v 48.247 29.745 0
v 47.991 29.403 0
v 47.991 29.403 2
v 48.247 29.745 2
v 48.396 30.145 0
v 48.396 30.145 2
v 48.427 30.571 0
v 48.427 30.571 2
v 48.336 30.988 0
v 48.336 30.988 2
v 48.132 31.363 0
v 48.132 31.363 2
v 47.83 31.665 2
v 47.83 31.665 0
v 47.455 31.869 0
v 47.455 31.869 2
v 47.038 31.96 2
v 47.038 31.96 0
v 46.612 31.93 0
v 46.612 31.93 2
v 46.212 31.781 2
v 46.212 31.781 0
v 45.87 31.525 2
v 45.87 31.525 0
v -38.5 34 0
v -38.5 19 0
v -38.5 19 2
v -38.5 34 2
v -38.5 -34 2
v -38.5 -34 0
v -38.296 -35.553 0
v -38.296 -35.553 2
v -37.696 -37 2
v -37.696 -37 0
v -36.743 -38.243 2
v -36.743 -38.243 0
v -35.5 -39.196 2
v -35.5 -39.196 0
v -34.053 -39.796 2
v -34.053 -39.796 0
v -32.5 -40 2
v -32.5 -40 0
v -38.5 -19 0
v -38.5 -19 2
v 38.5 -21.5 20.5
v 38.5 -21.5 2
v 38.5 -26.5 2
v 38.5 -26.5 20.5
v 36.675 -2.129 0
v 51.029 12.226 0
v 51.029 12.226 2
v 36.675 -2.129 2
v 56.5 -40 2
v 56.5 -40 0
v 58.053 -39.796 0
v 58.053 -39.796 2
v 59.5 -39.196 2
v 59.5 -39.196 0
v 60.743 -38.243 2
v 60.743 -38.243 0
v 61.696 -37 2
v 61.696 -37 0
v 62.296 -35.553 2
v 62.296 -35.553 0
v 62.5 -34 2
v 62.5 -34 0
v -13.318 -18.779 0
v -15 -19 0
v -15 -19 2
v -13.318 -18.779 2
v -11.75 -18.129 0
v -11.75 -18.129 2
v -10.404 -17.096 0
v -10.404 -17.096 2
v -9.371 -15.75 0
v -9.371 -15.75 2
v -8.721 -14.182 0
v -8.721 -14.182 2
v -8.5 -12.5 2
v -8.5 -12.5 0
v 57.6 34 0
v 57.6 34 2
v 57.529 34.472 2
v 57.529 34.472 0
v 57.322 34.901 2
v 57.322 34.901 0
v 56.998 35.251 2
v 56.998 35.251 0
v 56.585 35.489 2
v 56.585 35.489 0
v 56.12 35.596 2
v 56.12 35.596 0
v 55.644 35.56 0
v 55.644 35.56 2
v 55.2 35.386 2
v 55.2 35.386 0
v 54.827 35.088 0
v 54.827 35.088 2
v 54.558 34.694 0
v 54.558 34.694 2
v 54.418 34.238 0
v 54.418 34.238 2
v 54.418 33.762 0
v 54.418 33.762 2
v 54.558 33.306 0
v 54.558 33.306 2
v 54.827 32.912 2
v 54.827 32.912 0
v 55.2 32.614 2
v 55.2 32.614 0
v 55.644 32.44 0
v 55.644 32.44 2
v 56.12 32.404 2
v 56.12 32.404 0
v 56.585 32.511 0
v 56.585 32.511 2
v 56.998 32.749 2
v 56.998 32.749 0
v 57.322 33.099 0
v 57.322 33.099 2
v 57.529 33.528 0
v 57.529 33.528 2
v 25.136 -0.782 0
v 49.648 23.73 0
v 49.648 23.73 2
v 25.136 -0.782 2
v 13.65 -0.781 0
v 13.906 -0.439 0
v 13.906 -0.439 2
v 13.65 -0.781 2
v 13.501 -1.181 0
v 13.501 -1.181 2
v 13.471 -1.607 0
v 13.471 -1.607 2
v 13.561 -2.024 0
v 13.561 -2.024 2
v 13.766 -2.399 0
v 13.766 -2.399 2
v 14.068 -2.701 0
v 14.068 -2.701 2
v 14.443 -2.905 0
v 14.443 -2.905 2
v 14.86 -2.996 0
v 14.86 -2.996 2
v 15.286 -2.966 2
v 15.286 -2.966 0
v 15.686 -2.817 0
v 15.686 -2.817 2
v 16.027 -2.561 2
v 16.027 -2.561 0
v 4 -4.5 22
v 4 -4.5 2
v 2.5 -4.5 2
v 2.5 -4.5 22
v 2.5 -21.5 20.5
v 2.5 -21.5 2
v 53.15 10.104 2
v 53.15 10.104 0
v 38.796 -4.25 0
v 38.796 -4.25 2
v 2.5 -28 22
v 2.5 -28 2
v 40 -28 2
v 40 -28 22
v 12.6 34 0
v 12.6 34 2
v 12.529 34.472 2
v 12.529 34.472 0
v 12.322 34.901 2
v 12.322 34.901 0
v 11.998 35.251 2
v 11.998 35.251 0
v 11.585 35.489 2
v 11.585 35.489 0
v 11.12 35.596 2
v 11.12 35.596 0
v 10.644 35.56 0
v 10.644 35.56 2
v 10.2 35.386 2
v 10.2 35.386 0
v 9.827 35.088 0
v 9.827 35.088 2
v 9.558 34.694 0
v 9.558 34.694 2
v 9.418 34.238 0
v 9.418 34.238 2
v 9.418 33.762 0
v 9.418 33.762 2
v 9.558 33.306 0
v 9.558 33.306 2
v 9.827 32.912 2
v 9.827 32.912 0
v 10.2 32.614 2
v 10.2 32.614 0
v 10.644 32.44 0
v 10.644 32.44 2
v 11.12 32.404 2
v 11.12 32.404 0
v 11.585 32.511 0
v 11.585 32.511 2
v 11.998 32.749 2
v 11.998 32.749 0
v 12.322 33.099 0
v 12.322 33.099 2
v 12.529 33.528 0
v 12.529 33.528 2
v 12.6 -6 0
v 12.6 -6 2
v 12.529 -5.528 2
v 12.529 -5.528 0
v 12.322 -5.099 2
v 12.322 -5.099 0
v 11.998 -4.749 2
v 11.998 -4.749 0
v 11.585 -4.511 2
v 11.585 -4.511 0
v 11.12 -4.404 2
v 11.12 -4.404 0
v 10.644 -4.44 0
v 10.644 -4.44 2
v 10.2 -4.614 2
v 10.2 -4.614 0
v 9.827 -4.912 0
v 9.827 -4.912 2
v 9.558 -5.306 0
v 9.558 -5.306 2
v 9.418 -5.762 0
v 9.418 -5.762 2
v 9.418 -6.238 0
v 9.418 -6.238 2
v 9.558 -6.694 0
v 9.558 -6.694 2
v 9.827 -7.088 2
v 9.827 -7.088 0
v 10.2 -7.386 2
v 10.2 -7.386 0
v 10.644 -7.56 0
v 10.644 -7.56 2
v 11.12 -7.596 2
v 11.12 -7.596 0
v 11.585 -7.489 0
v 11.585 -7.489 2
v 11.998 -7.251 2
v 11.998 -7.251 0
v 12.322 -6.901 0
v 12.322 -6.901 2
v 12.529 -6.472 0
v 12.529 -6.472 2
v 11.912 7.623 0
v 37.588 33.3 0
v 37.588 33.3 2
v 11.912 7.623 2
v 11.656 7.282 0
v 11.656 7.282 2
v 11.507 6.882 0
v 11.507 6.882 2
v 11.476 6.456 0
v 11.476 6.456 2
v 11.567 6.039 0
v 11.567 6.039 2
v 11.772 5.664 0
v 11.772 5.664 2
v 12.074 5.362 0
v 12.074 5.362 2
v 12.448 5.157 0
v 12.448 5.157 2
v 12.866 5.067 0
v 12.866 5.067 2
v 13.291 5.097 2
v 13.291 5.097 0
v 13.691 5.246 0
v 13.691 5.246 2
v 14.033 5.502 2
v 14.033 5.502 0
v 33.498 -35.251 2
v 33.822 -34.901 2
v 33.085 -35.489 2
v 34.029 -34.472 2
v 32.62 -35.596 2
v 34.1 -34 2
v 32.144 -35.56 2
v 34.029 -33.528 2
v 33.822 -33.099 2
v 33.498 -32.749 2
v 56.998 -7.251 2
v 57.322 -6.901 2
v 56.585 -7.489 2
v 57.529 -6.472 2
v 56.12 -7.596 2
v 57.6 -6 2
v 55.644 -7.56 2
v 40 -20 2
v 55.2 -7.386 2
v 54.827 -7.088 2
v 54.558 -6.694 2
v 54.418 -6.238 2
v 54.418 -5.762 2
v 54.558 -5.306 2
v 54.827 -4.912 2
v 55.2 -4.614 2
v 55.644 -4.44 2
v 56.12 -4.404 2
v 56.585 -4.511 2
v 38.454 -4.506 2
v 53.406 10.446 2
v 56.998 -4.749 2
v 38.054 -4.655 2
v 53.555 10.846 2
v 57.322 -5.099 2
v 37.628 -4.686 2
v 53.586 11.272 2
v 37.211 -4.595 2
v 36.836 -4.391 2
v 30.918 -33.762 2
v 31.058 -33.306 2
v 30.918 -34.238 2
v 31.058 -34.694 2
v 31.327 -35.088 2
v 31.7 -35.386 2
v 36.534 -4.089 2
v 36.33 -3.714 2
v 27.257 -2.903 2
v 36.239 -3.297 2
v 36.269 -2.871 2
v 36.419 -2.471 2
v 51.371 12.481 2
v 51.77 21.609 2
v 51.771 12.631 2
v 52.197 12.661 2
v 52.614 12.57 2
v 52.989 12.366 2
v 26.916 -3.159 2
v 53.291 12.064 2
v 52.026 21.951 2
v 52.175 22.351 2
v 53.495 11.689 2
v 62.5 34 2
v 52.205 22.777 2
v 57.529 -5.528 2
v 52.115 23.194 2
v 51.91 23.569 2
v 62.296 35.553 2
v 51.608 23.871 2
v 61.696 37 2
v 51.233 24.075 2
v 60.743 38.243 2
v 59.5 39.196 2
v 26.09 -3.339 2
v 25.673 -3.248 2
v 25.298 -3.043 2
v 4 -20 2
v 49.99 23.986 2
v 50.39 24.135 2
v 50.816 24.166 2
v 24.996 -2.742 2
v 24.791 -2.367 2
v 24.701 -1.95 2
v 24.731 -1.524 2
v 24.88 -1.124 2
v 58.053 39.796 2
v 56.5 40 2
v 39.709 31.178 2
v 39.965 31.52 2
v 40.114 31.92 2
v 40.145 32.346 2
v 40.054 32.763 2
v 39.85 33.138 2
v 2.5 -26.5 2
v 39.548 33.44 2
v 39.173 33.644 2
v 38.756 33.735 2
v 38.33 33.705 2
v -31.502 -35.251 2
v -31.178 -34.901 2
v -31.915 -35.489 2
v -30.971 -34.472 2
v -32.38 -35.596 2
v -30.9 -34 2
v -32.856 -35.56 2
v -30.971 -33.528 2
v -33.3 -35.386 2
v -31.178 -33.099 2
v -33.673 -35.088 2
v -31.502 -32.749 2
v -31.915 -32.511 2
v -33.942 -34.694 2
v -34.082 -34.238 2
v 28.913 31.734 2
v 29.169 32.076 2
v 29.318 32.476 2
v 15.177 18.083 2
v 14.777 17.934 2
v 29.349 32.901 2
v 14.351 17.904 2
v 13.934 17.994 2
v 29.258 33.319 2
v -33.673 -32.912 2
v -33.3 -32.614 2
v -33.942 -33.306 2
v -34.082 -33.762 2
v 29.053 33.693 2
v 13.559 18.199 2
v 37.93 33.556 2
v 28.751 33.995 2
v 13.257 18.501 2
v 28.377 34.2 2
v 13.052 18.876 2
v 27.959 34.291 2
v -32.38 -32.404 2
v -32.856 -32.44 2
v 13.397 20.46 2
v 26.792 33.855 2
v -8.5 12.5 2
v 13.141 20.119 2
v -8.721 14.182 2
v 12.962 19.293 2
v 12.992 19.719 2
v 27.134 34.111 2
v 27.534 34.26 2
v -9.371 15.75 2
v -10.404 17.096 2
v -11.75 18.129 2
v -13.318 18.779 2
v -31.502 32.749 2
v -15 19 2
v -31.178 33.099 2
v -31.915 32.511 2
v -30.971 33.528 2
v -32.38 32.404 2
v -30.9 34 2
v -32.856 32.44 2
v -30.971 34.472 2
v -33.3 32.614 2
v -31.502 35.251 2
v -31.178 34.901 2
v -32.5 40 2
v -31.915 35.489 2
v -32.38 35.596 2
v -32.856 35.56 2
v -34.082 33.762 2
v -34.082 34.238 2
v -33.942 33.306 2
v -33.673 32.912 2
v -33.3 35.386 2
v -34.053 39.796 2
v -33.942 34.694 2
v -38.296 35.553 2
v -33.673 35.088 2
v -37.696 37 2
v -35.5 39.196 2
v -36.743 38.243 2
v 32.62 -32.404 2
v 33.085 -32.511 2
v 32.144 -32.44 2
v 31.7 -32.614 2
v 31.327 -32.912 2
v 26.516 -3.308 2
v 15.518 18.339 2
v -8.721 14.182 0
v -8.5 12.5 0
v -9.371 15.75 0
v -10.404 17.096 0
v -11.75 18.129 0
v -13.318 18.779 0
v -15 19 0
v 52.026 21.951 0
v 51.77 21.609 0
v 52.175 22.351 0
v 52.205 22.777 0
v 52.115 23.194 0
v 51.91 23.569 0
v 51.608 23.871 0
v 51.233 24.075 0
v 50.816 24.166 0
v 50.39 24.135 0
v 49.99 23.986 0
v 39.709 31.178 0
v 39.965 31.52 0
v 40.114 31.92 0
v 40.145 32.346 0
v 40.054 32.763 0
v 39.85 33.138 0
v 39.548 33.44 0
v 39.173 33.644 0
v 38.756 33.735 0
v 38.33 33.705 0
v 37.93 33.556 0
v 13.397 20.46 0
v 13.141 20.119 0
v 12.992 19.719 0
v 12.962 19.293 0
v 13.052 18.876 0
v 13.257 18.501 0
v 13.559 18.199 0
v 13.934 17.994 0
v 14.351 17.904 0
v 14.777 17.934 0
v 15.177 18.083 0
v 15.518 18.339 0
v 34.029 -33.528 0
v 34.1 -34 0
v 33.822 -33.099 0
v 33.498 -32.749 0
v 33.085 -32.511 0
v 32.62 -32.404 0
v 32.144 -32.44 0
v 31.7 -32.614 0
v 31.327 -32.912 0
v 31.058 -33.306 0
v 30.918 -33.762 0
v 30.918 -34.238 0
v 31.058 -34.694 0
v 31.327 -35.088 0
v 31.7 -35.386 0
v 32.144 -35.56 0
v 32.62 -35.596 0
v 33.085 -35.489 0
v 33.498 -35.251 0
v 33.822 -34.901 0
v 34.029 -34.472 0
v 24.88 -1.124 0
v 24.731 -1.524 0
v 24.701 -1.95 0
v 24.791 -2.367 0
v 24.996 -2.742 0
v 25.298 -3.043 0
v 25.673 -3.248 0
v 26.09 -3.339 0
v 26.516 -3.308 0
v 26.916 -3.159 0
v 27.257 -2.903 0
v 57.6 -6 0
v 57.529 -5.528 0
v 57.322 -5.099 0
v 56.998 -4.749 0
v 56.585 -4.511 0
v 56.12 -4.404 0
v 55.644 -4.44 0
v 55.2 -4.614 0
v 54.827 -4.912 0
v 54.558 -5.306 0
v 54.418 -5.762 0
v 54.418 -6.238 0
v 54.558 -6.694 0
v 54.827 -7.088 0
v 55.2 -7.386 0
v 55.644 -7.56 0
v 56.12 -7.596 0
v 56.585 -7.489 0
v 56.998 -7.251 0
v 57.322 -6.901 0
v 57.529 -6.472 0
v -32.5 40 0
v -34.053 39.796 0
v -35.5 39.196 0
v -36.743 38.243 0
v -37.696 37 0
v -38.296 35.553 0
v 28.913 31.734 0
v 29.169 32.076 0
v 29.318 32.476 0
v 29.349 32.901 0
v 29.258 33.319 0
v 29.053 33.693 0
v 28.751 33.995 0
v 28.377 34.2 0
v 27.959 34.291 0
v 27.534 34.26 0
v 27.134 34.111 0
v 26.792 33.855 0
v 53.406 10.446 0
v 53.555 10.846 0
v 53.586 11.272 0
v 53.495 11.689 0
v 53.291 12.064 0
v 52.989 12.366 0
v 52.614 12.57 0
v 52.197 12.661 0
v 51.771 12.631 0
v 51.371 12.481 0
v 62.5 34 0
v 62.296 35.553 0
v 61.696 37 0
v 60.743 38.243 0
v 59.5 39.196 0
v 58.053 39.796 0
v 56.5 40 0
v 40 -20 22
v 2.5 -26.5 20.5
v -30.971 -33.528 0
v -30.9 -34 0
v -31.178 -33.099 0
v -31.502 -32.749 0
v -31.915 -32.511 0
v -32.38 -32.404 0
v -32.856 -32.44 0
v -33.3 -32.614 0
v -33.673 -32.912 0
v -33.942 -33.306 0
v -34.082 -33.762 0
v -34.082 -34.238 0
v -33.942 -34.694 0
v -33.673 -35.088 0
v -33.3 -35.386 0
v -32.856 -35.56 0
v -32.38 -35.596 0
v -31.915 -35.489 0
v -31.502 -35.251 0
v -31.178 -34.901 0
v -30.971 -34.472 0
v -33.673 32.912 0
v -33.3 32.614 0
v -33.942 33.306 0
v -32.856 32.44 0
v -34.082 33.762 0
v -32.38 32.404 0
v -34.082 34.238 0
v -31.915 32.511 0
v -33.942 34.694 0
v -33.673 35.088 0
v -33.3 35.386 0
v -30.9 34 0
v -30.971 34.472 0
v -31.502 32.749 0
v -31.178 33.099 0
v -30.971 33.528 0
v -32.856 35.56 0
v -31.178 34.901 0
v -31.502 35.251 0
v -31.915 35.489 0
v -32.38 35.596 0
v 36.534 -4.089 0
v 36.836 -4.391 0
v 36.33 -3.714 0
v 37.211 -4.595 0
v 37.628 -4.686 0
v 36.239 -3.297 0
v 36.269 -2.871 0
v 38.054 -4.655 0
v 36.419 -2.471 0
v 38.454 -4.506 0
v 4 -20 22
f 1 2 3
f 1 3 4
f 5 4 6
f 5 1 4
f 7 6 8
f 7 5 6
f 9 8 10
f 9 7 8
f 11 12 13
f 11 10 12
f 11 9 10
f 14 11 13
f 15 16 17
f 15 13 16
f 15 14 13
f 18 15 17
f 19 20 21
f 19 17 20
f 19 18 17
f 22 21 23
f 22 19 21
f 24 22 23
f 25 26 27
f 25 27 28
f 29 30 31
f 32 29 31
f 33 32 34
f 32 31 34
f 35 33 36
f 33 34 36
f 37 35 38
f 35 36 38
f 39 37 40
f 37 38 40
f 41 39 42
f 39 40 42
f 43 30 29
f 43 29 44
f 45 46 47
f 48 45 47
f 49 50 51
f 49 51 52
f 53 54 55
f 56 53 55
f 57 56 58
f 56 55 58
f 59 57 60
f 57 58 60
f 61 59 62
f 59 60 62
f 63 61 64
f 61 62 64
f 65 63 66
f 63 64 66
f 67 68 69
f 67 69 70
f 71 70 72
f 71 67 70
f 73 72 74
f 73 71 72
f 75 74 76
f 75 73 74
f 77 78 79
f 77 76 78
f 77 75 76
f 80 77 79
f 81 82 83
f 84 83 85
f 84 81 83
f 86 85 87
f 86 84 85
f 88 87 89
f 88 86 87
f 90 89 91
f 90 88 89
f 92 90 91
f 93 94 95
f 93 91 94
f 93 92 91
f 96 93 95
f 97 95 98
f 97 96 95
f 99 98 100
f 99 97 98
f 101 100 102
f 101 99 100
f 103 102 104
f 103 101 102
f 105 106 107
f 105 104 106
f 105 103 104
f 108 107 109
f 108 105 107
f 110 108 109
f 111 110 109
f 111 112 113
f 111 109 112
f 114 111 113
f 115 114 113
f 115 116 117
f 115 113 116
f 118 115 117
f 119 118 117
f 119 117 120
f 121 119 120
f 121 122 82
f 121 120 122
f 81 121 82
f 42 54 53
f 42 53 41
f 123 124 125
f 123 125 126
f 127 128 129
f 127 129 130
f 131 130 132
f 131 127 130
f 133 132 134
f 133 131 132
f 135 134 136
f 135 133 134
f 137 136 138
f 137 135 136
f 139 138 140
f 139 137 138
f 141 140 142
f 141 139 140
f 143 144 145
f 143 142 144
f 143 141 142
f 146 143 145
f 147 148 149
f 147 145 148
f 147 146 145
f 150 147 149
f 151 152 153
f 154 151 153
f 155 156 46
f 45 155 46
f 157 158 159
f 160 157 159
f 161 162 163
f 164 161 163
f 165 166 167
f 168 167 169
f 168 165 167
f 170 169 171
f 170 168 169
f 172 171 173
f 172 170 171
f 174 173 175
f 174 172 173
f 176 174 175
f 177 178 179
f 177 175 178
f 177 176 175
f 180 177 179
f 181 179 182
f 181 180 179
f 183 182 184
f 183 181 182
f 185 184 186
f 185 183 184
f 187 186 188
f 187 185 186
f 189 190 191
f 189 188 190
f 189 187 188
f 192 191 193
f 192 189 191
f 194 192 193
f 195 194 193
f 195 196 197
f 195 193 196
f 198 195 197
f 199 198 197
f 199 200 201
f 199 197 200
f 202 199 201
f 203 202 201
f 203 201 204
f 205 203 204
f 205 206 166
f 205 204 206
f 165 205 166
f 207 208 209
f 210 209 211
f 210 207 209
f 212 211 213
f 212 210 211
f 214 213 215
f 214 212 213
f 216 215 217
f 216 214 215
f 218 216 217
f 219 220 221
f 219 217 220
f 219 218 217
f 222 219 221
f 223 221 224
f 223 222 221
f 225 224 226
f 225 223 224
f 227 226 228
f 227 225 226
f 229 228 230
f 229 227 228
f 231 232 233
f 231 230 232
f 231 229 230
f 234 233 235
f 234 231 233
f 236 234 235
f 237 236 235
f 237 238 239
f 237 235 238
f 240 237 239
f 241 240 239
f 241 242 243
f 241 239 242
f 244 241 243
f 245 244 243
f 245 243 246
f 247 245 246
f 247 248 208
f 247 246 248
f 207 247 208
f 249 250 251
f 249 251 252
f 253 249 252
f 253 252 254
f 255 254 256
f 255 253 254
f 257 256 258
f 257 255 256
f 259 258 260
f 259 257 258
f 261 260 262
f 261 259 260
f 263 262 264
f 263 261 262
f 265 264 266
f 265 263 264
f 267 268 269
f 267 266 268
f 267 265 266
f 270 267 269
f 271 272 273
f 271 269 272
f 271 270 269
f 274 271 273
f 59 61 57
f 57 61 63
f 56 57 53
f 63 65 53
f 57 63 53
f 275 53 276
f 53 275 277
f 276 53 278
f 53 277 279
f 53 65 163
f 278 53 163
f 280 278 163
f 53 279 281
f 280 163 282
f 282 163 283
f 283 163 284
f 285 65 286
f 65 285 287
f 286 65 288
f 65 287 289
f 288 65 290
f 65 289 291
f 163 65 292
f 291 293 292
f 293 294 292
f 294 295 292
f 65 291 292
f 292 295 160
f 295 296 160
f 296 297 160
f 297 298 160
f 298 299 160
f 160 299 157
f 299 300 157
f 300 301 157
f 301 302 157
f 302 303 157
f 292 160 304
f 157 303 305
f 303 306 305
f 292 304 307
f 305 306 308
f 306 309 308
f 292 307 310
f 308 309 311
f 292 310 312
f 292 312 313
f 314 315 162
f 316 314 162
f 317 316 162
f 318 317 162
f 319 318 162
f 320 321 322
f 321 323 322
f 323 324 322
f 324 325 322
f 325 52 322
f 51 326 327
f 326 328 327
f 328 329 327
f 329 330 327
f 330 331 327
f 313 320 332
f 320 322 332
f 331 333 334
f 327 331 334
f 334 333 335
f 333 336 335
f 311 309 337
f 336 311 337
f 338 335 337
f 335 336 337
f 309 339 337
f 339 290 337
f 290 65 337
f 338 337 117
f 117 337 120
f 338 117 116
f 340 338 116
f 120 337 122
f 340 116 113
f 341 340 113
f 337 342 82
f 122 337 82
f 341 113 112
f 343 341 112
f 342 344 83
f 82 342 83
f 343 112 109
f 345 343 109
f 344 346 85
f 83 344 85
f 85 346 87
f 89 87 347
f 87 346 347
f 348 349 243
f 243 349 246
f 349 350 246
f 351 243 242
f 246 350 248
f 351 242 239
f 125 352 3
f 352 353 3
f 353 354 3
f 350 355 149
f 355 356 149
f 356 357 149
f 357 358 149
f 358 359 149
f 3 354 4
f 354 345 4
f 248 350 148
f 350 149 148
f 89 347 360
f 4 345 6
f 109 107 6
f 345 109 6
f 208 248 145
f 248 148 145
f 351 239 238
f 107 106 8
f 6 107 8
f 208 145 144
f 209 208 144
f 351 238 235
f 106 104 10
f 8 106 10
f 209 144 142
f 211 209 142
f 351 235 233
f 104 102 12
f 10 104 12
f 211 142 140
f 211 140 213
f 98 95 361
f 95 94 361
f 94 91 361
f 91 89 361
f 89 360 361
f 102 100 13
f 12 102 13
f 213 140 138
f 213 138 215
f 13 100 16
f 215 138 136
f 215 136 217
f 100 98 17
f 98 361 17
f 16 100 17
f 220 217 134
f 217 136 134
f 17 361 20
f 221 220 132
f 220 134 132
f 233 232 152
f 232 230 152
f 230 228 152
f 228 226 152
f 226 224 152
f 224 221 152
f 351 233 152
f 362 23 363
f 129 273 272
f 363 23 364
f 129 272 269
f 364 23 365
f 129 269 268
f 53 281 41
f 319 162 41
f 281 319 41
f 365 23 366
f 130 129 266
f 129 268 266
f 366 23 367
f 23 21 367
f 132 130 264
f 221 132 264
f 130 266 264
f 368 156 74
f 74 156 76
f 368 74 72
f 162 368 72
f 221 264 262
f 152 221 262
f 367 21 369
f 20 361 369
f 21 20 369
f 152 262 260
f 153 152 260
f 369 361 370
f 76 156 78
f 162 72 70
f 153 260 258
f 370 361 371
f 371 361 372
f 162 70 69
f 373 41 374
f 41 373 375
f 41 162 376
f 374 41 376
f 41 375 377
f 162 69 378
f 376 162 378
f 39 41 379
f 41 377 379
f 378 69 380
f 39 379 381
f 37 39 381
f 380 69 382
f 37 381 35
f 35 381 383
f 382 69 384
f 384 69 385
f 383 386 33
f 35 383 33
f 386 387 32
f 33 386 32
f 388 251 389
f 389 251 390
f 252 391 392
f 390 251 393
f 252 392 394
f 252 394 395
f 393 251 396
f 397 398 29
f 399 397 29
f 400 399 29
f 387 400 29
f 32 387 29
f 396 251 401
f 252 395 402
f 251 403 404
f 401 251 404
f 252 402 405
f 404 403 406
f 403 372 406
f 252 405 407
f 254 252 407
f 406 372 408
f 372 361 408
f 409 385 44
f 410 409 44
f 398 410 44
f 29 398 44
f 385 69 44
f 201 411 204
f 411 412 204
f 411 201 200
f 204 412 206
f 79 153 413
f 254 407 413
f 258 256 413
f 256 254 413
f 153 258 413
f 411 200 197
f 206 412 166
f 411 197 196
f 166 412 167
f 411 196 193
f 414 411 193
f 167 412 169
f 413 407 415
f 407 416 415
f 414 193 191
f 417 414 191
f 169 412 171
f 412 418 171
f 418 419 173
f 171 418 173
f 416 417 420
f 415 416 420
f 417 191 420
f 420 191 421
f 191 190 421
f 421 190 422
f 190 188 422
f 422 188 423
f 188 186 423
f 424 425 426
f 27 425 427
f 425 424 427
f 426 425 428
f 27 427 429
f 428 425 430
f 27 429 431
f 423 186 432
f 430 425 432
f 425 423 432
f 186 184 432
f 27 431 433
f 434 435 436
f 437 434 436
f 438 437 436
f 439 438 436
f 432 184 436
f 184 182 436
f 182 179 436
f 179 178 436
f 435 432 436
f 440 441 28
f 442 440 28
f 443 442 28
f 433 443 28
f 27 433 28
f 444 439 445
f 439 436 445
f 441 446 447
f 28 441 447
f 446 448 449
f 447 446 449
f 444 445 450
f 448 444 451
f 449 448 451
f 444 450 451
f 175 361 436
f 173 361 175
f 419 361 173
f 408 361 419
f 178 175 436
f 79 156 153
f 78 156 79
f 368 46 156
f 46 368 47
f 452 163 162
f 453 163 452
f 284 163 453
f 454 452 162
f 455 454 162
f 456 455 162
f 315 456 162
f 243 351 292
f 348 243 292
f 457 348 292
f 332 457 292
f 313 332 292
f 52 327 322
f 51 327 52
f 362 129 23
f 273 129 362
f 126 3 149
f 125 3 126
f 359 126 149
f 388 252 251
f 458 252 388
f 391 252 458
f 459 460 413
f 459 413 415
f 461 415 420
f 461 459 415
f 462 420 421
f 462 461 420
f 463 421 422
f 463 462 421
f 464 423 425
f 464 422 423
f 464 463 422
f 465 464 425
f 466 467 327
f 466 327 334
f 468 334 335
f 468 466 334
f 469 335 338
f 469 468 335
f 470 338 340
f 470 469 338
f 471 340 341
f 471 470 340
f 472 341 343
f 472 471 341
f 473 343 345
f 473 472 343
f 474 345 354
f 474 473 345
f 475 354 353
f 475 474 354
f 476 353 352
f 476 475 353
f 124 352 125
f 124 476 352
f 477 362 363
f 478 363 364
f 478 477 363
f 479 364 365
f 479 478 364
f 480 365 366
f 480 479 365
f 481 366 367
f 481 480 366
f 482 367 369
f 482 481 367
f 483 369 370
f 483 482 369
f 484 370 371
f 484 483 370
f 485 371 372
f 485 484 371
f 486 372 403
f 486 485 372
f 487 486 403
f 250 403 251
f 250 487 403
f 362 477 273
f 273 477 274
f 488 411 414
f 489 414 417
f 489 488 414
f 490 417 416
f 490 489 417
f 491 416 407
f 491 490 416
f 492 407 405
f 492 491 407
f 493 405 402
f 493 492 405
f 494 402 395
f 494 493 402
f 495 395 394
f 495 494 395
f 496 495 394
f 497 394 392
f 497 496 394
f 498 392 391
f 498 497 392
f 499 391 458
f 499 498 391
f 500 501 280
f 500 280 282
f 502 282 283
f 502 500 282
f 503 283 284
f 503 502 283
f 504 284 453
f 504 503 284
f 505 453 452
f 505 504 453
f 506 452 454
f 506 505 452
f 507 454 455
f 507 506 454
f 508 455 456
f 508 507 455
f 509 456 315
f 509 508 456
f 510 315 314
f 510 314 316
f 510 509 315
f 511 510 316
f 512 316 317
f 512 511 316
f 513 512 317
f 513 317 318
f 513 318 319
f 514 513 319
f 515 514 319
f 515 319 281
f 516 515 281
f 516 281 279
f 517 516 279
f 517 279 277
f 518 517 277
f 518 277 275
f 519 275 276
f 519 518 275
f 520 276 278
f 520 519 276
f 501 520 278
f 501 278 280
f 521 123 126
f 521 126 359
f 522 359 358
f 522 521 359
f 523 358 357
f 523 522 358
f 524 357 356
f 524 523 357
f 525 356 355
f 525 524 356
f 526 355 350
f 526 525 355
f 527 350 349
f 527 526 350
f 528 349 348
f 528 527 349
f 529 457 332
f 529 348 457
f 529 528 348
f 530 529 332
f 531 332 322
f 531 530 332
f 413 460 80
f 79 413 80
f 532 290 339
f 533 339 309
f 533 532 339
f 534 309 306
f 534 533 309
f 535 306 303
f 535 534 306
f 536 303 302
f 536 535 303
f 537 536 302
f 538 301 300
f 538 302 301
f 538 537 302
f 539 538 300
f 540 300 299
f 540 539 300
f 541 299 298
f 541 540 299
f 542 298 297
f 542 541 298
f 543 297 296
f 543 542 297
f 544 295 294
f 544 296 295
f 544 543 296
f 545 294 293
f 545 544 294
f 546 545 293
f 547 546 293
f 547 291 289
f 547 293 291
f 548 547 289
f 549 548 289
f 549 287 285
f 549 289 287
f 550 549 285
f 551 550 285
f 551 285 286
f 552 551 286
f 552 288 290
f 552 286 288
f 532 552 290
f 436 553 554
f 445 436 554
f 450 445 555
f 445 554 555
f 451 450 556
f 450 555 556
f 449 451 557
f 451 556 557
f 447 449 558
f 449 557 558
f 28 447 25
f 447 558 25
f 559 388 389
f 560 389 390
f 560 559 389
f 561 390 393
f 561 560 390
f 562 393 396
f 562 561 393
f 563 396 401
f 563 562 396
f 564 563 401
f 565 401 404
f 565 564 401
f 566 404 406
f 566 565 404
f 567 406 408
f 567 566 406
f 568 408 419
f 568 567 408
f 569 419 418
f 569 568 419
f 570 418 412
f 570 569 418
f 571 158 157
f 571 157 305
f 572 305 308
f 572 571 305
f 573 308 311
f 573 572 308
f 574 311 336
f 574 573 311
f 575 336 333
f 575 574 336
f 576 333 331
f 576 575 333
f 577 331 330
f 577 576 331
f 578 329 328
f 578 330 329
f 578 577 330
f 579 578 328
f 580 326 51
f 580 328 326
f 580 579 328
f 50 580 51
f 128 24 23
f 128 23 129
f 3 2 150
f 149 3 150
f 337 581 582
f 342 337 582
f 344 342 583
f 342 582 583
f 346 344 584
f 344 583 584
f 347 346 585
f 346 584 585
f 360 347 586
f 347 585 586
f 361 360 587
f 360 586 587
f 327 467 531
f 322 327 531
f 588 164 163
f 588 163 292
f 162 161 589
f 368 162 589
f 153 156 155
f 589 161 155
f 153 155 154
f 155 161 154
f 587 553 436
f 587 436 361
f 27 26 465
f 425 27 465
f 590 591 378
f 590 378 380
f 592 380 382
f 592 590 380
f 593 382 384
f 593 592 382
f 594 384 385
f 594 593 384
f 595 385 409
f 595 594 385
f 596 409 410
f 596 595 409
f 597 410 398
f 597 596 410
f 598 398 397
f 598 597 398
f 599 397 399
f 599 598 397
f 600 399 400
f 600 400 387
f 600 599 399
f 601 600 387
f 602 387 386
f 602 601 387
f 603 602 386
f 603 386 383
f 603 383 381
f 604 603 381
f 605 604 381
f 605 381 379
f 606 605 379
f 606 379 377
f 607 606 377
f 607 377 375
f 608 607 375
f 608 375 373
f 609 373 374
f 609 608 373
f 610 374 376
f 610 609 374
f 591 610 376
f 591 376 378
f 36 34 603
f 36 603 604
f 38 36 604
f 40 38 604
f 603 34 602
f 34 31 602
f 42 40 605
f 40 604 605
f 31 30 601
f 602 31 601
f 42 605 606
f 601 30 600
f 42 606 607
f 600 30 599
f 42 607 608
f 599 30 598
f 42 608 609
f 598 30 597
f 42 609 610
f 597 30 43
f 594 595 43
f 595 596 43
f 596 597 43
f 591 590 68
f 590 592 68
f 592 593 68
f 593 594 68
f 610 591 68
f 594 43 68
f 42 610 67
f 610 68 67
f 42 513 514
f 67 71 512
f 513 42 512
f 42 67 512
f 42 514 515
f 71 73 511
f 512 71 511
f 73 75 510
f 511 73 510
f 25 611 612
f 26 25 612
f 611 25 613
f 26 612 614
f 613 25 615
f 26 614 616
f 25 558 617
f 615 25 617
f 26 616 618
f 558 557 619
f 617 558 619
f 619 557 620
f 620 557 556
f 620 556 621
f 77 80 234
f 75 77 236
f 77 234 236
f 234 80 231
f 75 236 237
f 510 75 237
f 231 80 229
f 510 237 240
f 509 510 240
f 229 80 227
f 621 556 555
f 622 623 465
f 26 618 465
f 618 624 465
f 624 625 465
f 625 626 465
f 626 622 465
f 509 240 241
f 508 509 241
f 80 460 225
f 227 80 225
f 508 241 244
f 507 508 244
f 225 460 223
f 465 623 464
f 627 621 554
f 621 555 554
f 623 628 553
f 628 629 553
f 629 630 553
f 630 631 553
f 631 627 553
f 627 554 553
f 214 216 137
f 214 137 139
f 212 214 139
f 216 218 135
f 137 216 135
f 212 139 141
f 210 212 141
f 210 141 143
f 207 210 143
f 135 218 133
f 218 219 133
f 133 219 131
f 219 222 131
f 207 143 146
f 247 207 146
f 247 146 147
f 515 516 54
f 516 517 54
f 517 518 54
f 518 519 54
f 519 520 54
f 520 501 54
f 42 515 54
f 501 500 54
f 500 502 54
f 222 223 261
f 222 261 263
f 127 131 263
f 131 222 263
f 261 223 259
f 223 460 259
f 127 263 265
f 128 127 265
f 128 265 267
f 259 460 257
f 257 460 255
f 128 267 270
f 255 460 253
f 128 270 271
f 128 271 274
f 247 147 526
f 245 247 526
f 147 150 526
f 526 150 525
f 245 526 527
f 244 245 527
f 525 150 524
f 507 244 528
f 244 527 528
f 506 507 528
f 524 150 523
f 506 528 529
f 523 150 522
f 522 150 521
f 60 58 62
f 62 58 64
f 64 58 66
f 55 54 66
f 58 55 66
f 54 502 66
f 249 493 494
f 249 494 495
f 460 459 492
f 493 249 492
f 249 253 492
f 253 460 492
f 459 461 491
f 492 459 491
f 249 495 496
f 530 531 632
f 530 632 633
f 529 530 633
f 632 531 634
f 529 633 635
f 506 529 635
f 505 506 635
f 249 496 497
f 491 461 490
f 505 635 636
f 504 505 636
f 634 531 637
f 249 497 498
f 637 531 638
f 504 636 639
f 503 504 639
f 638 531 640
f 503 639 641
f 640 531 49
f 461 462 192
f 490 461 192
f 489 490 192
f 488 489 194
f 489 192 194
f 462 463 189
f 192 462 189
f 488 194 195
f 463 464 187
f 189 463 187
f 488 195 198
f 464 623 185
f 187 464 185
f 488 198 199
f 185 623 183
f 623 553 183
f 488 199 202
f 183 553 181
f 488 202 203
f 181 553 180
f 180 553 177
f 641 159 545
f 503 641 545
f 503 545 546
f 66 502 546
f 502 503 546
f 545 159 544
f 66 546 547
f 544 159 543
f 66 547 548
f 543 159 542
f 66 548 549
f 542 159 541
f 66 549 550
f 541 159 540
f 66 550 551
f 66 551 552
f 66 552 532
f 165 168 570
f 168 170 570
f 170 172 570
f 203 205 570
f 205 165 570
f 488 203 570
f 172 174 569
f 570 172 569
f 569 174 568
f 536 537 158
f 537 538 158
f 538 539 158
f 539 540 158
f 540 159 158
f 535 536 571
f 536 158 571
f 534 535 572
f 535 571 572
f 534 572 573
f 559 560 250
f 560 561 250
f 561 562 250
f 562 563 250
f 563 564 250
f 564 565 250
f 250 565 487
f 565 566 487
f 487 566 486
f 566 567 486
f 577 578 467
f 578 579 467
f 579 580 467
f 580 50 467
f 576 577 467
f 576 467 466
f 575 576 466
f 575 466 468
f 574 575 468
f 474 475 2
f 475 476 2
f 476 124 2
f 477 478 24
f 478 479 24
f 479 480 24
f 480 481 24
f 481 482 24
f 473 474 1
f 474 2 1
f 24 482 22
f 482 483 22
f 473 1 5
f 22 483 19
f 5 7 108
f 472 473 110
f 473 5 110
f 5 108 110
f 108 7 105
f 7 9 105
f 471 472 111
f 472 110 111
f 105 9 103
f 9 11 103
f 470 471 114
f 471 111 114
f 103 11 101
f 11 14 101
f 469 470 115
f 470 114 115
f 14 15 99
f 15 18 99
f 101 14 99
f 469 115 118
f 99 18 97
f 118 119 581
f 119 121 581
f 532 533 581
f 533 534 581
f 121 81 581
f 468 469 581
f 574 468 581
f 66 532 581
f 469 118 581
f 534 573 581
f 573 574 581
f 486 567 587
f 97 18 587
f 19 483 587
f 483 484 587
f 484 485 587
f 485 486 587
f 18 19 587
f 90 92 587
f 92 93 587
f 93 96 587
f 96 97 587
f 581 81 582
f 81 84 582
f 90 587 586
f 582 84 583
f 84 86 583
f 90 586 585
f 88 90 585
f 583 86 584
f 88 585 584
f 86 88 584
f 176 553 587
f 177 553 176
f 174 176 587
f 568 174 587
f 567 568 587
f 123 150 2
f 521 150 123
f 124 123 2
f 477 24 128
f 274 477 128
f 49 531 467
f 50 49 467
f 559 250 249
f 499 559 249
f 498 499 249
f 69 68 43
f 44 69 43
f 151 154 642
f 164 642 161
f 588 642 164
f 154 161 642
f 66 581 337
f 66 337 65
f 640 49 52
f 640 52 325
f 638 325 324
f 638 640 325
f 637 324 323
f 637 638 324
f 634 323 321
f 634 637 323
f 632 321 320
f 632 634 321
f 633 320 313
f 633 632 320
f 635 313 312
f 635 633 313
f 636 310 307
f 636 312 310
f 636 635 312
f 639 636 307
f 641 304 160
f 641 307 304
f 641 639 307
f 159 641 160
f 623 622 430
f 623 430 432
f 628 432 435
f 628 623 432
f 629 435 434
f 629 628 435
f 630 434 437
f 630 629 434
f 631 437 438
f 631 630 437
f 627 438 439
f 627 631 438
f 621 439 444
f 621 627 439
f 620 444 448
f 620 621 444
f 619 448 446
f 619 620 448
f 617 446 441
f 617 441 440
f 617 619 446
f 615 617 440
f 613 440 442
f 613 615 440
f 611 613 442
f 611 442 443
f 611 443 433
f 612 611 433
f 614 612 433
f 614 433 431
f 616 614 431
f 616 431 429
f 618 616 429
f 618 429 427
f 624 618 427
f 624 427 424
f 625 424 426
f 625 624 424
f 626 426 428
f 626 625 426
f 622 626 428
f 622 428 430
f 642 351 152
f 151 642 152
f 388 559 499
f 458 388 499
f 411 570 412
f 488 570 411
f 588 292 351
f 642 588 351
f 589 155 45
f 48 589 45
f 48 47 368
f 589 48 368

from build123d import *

# Parameters (mm, degrees)
SKETCH_R        = 1.6
PAD_DEPTH       = 2
PAD001_DEPTH    = 22
SKETCH002_W     = 36
SKETCH002_H     = 5
PAD002_DEPTH    = 1.5
POCKET_DEPTH    = 22.001
SKETCH004_R     = 1.6
POCKET001_DEPTH = 22.001
POCKET002_DEPTH = 22.001


with BuildPart() as part:
    # Sketch → Pad (new body)
    with BuildSketch(Plane.XY):
        with BuildLine():
            Line((-32.5, 40), (56.5, 40))
            ThreePointArc((62.5, 34), (60.742641, 38.242641), (56.5, 40))
            Line((62.5, 34), (62.5, -34))
            ThreePointArc((56.5, -40), (60.742641, -38.242641), (62.5, -34))
            Line((56.5, -40), (-32.5, -40))
            ThreePointArc((-38.5, -34), (-36.742641, -38.242641), (-32.5, -40))
            Line((-38.5, -34), (-38.5, 34))
            ThreePointArc((-32.5, 40), (-36.742641, 38.242641), (-38.5, 34))
        make_face()
        with Locations((-32.5, 34)):
            Circle(SKETCH_R, mode=Mode.SUBTRACT)
        with Locations((-32.5, -34)):
            Circle(SKETCH_R, mode=Mode.SUBTRACT)
        with Locations((32.5, -34)):
            Circle(SKETCH_R, mode=Mode.SUBTRACT)
    extrude(amount=PAD_DEPTH)

    # Sketch001 → Pad001 (join)
    with BuildSketch(Plane.XY):
        Polygon((4, -4.5), (2.5, -4.5), (2.5, -21.5), (38.5, -21.5), (38.5, -26.5), (2.5, -26.5), (2.5, -28), (40, -28), (40, -20), (4, -20), align=None)
    extrude(amount=PAD001_DEPTH)

    # Sketch002 (on DatumPlane) → Pad002 (join)
    with BuildSketch(Plane.XY.offset(22)):
        with Locations((20.5, -24)):
            Rectangle(SKETCH002_W, SKETCH002_H)
    extrude(amount=-PAD002_DEPTH)

    # Sketch003 → Pocket (cut, through all)
    with BuildSketch(Plane.XY):
        with BuildLine():
            Line((-38.5, 19), (-15, 19))
            ThreePointArc((-8.5, 12.5), (-10.403806, 17.096194), (-15, 19))
            Line((-8.5, 12.5), (-8.5, -12.5))
            ThreePointArc((-15, -19), (-10.403806, -17.096194), (-8.5, -12.5))
            Line((-15, -19), (-38.5, -19))
            Line((-38.5, -19), (-38.5, 19))
        make_face()
    extrude(amount=POCKET_DEPTH, mode=Mode.SUBTRACT)

    # Sketch004 → Pocket001 (cut, through all)
    with BuildSketch(Plane.XY):
        with Locations((11, 34)):
            Circle(SKETCH004_R)
        with Locations((11, -6)):
            Circle(SKETCH004_R)
        with Locations((56, 34)):
            Circle(SKETCH004_R)
        with Locations((56, -6)):
            Circle(SKETCH004_R)
    extrude(amount=POCKET001_DEPTH, mode=Mode.SUBTRACT)

    # Sketch005 → Pocket002 (cut, through all)
    with BuildSketch(Plane.XY):
        with BuildLine():
            ThreePointArc((28.913069, 31.733732), (28.913069, 33.855052), (26.791749, 33.855052))
            Line((26.791749, 33.855052), (13.397064, 20.460367))
            ThreePointArc((13.397064, 20.460367), (13.397064, 18.339047), (15.518384, 18.339047))
            Line((28.913069, 31.733732), (15.518384, 18.339047))
        make_face()
        with BuildLine():
            ThreePointArc((39.709358, 31.178339), (39.709358, 33.29966), (37.588037, 33.29966))
            Line((37.588037, 33.29966), (11.911862, 7.623484))
            ThreePointArc((11.911862, 7.623484), (11.911862, 5.502164), (14.033182, 5.502164))
            Line((39.709358, 31.178339), (14.033182, 5.502164))
        make_face()
        with BuildLine():
            ThreePointArc((47.991417, 29.403364), (47.991417, 31.524684), (45.870097, 31.524684))
            Line((45.870097, 31.524684), (13.906073, -0.43934))
            ThreePointArc((13.906073, -0.43934), (13.906073, -2.56066), (16.027393, -2.56066))
            Line((47.991417, 29.403364), (16.027393, -2.56066))
        make_face()
        with BuildLine():
            ThreePointArc((51.769813, 21.609057), (51.769813, 23.730377), (49.648493, 23.730377))
            Line((49.648493, 23.730377), (25.136099, -0.782016))
            ThreePointArc((25.136099, -0.782016), (25.136099, -2.903337), (27.25742, -2.903337))
            Line((51.769813, 21.609057), (27.25742, -2.903337))
        make_face()
        with BuildLine():
            ThreePointArc((53.150439, 10.104192), (53.150439, 12.225512), (51.029119, 12.225512))
            Line((51.029119, 12.225512), (36.674542, -2.129064))
            ThreePointArc((36.674542, -2.129064), (36.674542, -4.250385), (38.795863, -4.250385))
            Line((53.150439, 10.104192), (38.795863, -4.250385))
        make_face()
    extrude(amount=POCKET002_DEPTH, mode=Mode.SUBTRACT)


solid = part.part
